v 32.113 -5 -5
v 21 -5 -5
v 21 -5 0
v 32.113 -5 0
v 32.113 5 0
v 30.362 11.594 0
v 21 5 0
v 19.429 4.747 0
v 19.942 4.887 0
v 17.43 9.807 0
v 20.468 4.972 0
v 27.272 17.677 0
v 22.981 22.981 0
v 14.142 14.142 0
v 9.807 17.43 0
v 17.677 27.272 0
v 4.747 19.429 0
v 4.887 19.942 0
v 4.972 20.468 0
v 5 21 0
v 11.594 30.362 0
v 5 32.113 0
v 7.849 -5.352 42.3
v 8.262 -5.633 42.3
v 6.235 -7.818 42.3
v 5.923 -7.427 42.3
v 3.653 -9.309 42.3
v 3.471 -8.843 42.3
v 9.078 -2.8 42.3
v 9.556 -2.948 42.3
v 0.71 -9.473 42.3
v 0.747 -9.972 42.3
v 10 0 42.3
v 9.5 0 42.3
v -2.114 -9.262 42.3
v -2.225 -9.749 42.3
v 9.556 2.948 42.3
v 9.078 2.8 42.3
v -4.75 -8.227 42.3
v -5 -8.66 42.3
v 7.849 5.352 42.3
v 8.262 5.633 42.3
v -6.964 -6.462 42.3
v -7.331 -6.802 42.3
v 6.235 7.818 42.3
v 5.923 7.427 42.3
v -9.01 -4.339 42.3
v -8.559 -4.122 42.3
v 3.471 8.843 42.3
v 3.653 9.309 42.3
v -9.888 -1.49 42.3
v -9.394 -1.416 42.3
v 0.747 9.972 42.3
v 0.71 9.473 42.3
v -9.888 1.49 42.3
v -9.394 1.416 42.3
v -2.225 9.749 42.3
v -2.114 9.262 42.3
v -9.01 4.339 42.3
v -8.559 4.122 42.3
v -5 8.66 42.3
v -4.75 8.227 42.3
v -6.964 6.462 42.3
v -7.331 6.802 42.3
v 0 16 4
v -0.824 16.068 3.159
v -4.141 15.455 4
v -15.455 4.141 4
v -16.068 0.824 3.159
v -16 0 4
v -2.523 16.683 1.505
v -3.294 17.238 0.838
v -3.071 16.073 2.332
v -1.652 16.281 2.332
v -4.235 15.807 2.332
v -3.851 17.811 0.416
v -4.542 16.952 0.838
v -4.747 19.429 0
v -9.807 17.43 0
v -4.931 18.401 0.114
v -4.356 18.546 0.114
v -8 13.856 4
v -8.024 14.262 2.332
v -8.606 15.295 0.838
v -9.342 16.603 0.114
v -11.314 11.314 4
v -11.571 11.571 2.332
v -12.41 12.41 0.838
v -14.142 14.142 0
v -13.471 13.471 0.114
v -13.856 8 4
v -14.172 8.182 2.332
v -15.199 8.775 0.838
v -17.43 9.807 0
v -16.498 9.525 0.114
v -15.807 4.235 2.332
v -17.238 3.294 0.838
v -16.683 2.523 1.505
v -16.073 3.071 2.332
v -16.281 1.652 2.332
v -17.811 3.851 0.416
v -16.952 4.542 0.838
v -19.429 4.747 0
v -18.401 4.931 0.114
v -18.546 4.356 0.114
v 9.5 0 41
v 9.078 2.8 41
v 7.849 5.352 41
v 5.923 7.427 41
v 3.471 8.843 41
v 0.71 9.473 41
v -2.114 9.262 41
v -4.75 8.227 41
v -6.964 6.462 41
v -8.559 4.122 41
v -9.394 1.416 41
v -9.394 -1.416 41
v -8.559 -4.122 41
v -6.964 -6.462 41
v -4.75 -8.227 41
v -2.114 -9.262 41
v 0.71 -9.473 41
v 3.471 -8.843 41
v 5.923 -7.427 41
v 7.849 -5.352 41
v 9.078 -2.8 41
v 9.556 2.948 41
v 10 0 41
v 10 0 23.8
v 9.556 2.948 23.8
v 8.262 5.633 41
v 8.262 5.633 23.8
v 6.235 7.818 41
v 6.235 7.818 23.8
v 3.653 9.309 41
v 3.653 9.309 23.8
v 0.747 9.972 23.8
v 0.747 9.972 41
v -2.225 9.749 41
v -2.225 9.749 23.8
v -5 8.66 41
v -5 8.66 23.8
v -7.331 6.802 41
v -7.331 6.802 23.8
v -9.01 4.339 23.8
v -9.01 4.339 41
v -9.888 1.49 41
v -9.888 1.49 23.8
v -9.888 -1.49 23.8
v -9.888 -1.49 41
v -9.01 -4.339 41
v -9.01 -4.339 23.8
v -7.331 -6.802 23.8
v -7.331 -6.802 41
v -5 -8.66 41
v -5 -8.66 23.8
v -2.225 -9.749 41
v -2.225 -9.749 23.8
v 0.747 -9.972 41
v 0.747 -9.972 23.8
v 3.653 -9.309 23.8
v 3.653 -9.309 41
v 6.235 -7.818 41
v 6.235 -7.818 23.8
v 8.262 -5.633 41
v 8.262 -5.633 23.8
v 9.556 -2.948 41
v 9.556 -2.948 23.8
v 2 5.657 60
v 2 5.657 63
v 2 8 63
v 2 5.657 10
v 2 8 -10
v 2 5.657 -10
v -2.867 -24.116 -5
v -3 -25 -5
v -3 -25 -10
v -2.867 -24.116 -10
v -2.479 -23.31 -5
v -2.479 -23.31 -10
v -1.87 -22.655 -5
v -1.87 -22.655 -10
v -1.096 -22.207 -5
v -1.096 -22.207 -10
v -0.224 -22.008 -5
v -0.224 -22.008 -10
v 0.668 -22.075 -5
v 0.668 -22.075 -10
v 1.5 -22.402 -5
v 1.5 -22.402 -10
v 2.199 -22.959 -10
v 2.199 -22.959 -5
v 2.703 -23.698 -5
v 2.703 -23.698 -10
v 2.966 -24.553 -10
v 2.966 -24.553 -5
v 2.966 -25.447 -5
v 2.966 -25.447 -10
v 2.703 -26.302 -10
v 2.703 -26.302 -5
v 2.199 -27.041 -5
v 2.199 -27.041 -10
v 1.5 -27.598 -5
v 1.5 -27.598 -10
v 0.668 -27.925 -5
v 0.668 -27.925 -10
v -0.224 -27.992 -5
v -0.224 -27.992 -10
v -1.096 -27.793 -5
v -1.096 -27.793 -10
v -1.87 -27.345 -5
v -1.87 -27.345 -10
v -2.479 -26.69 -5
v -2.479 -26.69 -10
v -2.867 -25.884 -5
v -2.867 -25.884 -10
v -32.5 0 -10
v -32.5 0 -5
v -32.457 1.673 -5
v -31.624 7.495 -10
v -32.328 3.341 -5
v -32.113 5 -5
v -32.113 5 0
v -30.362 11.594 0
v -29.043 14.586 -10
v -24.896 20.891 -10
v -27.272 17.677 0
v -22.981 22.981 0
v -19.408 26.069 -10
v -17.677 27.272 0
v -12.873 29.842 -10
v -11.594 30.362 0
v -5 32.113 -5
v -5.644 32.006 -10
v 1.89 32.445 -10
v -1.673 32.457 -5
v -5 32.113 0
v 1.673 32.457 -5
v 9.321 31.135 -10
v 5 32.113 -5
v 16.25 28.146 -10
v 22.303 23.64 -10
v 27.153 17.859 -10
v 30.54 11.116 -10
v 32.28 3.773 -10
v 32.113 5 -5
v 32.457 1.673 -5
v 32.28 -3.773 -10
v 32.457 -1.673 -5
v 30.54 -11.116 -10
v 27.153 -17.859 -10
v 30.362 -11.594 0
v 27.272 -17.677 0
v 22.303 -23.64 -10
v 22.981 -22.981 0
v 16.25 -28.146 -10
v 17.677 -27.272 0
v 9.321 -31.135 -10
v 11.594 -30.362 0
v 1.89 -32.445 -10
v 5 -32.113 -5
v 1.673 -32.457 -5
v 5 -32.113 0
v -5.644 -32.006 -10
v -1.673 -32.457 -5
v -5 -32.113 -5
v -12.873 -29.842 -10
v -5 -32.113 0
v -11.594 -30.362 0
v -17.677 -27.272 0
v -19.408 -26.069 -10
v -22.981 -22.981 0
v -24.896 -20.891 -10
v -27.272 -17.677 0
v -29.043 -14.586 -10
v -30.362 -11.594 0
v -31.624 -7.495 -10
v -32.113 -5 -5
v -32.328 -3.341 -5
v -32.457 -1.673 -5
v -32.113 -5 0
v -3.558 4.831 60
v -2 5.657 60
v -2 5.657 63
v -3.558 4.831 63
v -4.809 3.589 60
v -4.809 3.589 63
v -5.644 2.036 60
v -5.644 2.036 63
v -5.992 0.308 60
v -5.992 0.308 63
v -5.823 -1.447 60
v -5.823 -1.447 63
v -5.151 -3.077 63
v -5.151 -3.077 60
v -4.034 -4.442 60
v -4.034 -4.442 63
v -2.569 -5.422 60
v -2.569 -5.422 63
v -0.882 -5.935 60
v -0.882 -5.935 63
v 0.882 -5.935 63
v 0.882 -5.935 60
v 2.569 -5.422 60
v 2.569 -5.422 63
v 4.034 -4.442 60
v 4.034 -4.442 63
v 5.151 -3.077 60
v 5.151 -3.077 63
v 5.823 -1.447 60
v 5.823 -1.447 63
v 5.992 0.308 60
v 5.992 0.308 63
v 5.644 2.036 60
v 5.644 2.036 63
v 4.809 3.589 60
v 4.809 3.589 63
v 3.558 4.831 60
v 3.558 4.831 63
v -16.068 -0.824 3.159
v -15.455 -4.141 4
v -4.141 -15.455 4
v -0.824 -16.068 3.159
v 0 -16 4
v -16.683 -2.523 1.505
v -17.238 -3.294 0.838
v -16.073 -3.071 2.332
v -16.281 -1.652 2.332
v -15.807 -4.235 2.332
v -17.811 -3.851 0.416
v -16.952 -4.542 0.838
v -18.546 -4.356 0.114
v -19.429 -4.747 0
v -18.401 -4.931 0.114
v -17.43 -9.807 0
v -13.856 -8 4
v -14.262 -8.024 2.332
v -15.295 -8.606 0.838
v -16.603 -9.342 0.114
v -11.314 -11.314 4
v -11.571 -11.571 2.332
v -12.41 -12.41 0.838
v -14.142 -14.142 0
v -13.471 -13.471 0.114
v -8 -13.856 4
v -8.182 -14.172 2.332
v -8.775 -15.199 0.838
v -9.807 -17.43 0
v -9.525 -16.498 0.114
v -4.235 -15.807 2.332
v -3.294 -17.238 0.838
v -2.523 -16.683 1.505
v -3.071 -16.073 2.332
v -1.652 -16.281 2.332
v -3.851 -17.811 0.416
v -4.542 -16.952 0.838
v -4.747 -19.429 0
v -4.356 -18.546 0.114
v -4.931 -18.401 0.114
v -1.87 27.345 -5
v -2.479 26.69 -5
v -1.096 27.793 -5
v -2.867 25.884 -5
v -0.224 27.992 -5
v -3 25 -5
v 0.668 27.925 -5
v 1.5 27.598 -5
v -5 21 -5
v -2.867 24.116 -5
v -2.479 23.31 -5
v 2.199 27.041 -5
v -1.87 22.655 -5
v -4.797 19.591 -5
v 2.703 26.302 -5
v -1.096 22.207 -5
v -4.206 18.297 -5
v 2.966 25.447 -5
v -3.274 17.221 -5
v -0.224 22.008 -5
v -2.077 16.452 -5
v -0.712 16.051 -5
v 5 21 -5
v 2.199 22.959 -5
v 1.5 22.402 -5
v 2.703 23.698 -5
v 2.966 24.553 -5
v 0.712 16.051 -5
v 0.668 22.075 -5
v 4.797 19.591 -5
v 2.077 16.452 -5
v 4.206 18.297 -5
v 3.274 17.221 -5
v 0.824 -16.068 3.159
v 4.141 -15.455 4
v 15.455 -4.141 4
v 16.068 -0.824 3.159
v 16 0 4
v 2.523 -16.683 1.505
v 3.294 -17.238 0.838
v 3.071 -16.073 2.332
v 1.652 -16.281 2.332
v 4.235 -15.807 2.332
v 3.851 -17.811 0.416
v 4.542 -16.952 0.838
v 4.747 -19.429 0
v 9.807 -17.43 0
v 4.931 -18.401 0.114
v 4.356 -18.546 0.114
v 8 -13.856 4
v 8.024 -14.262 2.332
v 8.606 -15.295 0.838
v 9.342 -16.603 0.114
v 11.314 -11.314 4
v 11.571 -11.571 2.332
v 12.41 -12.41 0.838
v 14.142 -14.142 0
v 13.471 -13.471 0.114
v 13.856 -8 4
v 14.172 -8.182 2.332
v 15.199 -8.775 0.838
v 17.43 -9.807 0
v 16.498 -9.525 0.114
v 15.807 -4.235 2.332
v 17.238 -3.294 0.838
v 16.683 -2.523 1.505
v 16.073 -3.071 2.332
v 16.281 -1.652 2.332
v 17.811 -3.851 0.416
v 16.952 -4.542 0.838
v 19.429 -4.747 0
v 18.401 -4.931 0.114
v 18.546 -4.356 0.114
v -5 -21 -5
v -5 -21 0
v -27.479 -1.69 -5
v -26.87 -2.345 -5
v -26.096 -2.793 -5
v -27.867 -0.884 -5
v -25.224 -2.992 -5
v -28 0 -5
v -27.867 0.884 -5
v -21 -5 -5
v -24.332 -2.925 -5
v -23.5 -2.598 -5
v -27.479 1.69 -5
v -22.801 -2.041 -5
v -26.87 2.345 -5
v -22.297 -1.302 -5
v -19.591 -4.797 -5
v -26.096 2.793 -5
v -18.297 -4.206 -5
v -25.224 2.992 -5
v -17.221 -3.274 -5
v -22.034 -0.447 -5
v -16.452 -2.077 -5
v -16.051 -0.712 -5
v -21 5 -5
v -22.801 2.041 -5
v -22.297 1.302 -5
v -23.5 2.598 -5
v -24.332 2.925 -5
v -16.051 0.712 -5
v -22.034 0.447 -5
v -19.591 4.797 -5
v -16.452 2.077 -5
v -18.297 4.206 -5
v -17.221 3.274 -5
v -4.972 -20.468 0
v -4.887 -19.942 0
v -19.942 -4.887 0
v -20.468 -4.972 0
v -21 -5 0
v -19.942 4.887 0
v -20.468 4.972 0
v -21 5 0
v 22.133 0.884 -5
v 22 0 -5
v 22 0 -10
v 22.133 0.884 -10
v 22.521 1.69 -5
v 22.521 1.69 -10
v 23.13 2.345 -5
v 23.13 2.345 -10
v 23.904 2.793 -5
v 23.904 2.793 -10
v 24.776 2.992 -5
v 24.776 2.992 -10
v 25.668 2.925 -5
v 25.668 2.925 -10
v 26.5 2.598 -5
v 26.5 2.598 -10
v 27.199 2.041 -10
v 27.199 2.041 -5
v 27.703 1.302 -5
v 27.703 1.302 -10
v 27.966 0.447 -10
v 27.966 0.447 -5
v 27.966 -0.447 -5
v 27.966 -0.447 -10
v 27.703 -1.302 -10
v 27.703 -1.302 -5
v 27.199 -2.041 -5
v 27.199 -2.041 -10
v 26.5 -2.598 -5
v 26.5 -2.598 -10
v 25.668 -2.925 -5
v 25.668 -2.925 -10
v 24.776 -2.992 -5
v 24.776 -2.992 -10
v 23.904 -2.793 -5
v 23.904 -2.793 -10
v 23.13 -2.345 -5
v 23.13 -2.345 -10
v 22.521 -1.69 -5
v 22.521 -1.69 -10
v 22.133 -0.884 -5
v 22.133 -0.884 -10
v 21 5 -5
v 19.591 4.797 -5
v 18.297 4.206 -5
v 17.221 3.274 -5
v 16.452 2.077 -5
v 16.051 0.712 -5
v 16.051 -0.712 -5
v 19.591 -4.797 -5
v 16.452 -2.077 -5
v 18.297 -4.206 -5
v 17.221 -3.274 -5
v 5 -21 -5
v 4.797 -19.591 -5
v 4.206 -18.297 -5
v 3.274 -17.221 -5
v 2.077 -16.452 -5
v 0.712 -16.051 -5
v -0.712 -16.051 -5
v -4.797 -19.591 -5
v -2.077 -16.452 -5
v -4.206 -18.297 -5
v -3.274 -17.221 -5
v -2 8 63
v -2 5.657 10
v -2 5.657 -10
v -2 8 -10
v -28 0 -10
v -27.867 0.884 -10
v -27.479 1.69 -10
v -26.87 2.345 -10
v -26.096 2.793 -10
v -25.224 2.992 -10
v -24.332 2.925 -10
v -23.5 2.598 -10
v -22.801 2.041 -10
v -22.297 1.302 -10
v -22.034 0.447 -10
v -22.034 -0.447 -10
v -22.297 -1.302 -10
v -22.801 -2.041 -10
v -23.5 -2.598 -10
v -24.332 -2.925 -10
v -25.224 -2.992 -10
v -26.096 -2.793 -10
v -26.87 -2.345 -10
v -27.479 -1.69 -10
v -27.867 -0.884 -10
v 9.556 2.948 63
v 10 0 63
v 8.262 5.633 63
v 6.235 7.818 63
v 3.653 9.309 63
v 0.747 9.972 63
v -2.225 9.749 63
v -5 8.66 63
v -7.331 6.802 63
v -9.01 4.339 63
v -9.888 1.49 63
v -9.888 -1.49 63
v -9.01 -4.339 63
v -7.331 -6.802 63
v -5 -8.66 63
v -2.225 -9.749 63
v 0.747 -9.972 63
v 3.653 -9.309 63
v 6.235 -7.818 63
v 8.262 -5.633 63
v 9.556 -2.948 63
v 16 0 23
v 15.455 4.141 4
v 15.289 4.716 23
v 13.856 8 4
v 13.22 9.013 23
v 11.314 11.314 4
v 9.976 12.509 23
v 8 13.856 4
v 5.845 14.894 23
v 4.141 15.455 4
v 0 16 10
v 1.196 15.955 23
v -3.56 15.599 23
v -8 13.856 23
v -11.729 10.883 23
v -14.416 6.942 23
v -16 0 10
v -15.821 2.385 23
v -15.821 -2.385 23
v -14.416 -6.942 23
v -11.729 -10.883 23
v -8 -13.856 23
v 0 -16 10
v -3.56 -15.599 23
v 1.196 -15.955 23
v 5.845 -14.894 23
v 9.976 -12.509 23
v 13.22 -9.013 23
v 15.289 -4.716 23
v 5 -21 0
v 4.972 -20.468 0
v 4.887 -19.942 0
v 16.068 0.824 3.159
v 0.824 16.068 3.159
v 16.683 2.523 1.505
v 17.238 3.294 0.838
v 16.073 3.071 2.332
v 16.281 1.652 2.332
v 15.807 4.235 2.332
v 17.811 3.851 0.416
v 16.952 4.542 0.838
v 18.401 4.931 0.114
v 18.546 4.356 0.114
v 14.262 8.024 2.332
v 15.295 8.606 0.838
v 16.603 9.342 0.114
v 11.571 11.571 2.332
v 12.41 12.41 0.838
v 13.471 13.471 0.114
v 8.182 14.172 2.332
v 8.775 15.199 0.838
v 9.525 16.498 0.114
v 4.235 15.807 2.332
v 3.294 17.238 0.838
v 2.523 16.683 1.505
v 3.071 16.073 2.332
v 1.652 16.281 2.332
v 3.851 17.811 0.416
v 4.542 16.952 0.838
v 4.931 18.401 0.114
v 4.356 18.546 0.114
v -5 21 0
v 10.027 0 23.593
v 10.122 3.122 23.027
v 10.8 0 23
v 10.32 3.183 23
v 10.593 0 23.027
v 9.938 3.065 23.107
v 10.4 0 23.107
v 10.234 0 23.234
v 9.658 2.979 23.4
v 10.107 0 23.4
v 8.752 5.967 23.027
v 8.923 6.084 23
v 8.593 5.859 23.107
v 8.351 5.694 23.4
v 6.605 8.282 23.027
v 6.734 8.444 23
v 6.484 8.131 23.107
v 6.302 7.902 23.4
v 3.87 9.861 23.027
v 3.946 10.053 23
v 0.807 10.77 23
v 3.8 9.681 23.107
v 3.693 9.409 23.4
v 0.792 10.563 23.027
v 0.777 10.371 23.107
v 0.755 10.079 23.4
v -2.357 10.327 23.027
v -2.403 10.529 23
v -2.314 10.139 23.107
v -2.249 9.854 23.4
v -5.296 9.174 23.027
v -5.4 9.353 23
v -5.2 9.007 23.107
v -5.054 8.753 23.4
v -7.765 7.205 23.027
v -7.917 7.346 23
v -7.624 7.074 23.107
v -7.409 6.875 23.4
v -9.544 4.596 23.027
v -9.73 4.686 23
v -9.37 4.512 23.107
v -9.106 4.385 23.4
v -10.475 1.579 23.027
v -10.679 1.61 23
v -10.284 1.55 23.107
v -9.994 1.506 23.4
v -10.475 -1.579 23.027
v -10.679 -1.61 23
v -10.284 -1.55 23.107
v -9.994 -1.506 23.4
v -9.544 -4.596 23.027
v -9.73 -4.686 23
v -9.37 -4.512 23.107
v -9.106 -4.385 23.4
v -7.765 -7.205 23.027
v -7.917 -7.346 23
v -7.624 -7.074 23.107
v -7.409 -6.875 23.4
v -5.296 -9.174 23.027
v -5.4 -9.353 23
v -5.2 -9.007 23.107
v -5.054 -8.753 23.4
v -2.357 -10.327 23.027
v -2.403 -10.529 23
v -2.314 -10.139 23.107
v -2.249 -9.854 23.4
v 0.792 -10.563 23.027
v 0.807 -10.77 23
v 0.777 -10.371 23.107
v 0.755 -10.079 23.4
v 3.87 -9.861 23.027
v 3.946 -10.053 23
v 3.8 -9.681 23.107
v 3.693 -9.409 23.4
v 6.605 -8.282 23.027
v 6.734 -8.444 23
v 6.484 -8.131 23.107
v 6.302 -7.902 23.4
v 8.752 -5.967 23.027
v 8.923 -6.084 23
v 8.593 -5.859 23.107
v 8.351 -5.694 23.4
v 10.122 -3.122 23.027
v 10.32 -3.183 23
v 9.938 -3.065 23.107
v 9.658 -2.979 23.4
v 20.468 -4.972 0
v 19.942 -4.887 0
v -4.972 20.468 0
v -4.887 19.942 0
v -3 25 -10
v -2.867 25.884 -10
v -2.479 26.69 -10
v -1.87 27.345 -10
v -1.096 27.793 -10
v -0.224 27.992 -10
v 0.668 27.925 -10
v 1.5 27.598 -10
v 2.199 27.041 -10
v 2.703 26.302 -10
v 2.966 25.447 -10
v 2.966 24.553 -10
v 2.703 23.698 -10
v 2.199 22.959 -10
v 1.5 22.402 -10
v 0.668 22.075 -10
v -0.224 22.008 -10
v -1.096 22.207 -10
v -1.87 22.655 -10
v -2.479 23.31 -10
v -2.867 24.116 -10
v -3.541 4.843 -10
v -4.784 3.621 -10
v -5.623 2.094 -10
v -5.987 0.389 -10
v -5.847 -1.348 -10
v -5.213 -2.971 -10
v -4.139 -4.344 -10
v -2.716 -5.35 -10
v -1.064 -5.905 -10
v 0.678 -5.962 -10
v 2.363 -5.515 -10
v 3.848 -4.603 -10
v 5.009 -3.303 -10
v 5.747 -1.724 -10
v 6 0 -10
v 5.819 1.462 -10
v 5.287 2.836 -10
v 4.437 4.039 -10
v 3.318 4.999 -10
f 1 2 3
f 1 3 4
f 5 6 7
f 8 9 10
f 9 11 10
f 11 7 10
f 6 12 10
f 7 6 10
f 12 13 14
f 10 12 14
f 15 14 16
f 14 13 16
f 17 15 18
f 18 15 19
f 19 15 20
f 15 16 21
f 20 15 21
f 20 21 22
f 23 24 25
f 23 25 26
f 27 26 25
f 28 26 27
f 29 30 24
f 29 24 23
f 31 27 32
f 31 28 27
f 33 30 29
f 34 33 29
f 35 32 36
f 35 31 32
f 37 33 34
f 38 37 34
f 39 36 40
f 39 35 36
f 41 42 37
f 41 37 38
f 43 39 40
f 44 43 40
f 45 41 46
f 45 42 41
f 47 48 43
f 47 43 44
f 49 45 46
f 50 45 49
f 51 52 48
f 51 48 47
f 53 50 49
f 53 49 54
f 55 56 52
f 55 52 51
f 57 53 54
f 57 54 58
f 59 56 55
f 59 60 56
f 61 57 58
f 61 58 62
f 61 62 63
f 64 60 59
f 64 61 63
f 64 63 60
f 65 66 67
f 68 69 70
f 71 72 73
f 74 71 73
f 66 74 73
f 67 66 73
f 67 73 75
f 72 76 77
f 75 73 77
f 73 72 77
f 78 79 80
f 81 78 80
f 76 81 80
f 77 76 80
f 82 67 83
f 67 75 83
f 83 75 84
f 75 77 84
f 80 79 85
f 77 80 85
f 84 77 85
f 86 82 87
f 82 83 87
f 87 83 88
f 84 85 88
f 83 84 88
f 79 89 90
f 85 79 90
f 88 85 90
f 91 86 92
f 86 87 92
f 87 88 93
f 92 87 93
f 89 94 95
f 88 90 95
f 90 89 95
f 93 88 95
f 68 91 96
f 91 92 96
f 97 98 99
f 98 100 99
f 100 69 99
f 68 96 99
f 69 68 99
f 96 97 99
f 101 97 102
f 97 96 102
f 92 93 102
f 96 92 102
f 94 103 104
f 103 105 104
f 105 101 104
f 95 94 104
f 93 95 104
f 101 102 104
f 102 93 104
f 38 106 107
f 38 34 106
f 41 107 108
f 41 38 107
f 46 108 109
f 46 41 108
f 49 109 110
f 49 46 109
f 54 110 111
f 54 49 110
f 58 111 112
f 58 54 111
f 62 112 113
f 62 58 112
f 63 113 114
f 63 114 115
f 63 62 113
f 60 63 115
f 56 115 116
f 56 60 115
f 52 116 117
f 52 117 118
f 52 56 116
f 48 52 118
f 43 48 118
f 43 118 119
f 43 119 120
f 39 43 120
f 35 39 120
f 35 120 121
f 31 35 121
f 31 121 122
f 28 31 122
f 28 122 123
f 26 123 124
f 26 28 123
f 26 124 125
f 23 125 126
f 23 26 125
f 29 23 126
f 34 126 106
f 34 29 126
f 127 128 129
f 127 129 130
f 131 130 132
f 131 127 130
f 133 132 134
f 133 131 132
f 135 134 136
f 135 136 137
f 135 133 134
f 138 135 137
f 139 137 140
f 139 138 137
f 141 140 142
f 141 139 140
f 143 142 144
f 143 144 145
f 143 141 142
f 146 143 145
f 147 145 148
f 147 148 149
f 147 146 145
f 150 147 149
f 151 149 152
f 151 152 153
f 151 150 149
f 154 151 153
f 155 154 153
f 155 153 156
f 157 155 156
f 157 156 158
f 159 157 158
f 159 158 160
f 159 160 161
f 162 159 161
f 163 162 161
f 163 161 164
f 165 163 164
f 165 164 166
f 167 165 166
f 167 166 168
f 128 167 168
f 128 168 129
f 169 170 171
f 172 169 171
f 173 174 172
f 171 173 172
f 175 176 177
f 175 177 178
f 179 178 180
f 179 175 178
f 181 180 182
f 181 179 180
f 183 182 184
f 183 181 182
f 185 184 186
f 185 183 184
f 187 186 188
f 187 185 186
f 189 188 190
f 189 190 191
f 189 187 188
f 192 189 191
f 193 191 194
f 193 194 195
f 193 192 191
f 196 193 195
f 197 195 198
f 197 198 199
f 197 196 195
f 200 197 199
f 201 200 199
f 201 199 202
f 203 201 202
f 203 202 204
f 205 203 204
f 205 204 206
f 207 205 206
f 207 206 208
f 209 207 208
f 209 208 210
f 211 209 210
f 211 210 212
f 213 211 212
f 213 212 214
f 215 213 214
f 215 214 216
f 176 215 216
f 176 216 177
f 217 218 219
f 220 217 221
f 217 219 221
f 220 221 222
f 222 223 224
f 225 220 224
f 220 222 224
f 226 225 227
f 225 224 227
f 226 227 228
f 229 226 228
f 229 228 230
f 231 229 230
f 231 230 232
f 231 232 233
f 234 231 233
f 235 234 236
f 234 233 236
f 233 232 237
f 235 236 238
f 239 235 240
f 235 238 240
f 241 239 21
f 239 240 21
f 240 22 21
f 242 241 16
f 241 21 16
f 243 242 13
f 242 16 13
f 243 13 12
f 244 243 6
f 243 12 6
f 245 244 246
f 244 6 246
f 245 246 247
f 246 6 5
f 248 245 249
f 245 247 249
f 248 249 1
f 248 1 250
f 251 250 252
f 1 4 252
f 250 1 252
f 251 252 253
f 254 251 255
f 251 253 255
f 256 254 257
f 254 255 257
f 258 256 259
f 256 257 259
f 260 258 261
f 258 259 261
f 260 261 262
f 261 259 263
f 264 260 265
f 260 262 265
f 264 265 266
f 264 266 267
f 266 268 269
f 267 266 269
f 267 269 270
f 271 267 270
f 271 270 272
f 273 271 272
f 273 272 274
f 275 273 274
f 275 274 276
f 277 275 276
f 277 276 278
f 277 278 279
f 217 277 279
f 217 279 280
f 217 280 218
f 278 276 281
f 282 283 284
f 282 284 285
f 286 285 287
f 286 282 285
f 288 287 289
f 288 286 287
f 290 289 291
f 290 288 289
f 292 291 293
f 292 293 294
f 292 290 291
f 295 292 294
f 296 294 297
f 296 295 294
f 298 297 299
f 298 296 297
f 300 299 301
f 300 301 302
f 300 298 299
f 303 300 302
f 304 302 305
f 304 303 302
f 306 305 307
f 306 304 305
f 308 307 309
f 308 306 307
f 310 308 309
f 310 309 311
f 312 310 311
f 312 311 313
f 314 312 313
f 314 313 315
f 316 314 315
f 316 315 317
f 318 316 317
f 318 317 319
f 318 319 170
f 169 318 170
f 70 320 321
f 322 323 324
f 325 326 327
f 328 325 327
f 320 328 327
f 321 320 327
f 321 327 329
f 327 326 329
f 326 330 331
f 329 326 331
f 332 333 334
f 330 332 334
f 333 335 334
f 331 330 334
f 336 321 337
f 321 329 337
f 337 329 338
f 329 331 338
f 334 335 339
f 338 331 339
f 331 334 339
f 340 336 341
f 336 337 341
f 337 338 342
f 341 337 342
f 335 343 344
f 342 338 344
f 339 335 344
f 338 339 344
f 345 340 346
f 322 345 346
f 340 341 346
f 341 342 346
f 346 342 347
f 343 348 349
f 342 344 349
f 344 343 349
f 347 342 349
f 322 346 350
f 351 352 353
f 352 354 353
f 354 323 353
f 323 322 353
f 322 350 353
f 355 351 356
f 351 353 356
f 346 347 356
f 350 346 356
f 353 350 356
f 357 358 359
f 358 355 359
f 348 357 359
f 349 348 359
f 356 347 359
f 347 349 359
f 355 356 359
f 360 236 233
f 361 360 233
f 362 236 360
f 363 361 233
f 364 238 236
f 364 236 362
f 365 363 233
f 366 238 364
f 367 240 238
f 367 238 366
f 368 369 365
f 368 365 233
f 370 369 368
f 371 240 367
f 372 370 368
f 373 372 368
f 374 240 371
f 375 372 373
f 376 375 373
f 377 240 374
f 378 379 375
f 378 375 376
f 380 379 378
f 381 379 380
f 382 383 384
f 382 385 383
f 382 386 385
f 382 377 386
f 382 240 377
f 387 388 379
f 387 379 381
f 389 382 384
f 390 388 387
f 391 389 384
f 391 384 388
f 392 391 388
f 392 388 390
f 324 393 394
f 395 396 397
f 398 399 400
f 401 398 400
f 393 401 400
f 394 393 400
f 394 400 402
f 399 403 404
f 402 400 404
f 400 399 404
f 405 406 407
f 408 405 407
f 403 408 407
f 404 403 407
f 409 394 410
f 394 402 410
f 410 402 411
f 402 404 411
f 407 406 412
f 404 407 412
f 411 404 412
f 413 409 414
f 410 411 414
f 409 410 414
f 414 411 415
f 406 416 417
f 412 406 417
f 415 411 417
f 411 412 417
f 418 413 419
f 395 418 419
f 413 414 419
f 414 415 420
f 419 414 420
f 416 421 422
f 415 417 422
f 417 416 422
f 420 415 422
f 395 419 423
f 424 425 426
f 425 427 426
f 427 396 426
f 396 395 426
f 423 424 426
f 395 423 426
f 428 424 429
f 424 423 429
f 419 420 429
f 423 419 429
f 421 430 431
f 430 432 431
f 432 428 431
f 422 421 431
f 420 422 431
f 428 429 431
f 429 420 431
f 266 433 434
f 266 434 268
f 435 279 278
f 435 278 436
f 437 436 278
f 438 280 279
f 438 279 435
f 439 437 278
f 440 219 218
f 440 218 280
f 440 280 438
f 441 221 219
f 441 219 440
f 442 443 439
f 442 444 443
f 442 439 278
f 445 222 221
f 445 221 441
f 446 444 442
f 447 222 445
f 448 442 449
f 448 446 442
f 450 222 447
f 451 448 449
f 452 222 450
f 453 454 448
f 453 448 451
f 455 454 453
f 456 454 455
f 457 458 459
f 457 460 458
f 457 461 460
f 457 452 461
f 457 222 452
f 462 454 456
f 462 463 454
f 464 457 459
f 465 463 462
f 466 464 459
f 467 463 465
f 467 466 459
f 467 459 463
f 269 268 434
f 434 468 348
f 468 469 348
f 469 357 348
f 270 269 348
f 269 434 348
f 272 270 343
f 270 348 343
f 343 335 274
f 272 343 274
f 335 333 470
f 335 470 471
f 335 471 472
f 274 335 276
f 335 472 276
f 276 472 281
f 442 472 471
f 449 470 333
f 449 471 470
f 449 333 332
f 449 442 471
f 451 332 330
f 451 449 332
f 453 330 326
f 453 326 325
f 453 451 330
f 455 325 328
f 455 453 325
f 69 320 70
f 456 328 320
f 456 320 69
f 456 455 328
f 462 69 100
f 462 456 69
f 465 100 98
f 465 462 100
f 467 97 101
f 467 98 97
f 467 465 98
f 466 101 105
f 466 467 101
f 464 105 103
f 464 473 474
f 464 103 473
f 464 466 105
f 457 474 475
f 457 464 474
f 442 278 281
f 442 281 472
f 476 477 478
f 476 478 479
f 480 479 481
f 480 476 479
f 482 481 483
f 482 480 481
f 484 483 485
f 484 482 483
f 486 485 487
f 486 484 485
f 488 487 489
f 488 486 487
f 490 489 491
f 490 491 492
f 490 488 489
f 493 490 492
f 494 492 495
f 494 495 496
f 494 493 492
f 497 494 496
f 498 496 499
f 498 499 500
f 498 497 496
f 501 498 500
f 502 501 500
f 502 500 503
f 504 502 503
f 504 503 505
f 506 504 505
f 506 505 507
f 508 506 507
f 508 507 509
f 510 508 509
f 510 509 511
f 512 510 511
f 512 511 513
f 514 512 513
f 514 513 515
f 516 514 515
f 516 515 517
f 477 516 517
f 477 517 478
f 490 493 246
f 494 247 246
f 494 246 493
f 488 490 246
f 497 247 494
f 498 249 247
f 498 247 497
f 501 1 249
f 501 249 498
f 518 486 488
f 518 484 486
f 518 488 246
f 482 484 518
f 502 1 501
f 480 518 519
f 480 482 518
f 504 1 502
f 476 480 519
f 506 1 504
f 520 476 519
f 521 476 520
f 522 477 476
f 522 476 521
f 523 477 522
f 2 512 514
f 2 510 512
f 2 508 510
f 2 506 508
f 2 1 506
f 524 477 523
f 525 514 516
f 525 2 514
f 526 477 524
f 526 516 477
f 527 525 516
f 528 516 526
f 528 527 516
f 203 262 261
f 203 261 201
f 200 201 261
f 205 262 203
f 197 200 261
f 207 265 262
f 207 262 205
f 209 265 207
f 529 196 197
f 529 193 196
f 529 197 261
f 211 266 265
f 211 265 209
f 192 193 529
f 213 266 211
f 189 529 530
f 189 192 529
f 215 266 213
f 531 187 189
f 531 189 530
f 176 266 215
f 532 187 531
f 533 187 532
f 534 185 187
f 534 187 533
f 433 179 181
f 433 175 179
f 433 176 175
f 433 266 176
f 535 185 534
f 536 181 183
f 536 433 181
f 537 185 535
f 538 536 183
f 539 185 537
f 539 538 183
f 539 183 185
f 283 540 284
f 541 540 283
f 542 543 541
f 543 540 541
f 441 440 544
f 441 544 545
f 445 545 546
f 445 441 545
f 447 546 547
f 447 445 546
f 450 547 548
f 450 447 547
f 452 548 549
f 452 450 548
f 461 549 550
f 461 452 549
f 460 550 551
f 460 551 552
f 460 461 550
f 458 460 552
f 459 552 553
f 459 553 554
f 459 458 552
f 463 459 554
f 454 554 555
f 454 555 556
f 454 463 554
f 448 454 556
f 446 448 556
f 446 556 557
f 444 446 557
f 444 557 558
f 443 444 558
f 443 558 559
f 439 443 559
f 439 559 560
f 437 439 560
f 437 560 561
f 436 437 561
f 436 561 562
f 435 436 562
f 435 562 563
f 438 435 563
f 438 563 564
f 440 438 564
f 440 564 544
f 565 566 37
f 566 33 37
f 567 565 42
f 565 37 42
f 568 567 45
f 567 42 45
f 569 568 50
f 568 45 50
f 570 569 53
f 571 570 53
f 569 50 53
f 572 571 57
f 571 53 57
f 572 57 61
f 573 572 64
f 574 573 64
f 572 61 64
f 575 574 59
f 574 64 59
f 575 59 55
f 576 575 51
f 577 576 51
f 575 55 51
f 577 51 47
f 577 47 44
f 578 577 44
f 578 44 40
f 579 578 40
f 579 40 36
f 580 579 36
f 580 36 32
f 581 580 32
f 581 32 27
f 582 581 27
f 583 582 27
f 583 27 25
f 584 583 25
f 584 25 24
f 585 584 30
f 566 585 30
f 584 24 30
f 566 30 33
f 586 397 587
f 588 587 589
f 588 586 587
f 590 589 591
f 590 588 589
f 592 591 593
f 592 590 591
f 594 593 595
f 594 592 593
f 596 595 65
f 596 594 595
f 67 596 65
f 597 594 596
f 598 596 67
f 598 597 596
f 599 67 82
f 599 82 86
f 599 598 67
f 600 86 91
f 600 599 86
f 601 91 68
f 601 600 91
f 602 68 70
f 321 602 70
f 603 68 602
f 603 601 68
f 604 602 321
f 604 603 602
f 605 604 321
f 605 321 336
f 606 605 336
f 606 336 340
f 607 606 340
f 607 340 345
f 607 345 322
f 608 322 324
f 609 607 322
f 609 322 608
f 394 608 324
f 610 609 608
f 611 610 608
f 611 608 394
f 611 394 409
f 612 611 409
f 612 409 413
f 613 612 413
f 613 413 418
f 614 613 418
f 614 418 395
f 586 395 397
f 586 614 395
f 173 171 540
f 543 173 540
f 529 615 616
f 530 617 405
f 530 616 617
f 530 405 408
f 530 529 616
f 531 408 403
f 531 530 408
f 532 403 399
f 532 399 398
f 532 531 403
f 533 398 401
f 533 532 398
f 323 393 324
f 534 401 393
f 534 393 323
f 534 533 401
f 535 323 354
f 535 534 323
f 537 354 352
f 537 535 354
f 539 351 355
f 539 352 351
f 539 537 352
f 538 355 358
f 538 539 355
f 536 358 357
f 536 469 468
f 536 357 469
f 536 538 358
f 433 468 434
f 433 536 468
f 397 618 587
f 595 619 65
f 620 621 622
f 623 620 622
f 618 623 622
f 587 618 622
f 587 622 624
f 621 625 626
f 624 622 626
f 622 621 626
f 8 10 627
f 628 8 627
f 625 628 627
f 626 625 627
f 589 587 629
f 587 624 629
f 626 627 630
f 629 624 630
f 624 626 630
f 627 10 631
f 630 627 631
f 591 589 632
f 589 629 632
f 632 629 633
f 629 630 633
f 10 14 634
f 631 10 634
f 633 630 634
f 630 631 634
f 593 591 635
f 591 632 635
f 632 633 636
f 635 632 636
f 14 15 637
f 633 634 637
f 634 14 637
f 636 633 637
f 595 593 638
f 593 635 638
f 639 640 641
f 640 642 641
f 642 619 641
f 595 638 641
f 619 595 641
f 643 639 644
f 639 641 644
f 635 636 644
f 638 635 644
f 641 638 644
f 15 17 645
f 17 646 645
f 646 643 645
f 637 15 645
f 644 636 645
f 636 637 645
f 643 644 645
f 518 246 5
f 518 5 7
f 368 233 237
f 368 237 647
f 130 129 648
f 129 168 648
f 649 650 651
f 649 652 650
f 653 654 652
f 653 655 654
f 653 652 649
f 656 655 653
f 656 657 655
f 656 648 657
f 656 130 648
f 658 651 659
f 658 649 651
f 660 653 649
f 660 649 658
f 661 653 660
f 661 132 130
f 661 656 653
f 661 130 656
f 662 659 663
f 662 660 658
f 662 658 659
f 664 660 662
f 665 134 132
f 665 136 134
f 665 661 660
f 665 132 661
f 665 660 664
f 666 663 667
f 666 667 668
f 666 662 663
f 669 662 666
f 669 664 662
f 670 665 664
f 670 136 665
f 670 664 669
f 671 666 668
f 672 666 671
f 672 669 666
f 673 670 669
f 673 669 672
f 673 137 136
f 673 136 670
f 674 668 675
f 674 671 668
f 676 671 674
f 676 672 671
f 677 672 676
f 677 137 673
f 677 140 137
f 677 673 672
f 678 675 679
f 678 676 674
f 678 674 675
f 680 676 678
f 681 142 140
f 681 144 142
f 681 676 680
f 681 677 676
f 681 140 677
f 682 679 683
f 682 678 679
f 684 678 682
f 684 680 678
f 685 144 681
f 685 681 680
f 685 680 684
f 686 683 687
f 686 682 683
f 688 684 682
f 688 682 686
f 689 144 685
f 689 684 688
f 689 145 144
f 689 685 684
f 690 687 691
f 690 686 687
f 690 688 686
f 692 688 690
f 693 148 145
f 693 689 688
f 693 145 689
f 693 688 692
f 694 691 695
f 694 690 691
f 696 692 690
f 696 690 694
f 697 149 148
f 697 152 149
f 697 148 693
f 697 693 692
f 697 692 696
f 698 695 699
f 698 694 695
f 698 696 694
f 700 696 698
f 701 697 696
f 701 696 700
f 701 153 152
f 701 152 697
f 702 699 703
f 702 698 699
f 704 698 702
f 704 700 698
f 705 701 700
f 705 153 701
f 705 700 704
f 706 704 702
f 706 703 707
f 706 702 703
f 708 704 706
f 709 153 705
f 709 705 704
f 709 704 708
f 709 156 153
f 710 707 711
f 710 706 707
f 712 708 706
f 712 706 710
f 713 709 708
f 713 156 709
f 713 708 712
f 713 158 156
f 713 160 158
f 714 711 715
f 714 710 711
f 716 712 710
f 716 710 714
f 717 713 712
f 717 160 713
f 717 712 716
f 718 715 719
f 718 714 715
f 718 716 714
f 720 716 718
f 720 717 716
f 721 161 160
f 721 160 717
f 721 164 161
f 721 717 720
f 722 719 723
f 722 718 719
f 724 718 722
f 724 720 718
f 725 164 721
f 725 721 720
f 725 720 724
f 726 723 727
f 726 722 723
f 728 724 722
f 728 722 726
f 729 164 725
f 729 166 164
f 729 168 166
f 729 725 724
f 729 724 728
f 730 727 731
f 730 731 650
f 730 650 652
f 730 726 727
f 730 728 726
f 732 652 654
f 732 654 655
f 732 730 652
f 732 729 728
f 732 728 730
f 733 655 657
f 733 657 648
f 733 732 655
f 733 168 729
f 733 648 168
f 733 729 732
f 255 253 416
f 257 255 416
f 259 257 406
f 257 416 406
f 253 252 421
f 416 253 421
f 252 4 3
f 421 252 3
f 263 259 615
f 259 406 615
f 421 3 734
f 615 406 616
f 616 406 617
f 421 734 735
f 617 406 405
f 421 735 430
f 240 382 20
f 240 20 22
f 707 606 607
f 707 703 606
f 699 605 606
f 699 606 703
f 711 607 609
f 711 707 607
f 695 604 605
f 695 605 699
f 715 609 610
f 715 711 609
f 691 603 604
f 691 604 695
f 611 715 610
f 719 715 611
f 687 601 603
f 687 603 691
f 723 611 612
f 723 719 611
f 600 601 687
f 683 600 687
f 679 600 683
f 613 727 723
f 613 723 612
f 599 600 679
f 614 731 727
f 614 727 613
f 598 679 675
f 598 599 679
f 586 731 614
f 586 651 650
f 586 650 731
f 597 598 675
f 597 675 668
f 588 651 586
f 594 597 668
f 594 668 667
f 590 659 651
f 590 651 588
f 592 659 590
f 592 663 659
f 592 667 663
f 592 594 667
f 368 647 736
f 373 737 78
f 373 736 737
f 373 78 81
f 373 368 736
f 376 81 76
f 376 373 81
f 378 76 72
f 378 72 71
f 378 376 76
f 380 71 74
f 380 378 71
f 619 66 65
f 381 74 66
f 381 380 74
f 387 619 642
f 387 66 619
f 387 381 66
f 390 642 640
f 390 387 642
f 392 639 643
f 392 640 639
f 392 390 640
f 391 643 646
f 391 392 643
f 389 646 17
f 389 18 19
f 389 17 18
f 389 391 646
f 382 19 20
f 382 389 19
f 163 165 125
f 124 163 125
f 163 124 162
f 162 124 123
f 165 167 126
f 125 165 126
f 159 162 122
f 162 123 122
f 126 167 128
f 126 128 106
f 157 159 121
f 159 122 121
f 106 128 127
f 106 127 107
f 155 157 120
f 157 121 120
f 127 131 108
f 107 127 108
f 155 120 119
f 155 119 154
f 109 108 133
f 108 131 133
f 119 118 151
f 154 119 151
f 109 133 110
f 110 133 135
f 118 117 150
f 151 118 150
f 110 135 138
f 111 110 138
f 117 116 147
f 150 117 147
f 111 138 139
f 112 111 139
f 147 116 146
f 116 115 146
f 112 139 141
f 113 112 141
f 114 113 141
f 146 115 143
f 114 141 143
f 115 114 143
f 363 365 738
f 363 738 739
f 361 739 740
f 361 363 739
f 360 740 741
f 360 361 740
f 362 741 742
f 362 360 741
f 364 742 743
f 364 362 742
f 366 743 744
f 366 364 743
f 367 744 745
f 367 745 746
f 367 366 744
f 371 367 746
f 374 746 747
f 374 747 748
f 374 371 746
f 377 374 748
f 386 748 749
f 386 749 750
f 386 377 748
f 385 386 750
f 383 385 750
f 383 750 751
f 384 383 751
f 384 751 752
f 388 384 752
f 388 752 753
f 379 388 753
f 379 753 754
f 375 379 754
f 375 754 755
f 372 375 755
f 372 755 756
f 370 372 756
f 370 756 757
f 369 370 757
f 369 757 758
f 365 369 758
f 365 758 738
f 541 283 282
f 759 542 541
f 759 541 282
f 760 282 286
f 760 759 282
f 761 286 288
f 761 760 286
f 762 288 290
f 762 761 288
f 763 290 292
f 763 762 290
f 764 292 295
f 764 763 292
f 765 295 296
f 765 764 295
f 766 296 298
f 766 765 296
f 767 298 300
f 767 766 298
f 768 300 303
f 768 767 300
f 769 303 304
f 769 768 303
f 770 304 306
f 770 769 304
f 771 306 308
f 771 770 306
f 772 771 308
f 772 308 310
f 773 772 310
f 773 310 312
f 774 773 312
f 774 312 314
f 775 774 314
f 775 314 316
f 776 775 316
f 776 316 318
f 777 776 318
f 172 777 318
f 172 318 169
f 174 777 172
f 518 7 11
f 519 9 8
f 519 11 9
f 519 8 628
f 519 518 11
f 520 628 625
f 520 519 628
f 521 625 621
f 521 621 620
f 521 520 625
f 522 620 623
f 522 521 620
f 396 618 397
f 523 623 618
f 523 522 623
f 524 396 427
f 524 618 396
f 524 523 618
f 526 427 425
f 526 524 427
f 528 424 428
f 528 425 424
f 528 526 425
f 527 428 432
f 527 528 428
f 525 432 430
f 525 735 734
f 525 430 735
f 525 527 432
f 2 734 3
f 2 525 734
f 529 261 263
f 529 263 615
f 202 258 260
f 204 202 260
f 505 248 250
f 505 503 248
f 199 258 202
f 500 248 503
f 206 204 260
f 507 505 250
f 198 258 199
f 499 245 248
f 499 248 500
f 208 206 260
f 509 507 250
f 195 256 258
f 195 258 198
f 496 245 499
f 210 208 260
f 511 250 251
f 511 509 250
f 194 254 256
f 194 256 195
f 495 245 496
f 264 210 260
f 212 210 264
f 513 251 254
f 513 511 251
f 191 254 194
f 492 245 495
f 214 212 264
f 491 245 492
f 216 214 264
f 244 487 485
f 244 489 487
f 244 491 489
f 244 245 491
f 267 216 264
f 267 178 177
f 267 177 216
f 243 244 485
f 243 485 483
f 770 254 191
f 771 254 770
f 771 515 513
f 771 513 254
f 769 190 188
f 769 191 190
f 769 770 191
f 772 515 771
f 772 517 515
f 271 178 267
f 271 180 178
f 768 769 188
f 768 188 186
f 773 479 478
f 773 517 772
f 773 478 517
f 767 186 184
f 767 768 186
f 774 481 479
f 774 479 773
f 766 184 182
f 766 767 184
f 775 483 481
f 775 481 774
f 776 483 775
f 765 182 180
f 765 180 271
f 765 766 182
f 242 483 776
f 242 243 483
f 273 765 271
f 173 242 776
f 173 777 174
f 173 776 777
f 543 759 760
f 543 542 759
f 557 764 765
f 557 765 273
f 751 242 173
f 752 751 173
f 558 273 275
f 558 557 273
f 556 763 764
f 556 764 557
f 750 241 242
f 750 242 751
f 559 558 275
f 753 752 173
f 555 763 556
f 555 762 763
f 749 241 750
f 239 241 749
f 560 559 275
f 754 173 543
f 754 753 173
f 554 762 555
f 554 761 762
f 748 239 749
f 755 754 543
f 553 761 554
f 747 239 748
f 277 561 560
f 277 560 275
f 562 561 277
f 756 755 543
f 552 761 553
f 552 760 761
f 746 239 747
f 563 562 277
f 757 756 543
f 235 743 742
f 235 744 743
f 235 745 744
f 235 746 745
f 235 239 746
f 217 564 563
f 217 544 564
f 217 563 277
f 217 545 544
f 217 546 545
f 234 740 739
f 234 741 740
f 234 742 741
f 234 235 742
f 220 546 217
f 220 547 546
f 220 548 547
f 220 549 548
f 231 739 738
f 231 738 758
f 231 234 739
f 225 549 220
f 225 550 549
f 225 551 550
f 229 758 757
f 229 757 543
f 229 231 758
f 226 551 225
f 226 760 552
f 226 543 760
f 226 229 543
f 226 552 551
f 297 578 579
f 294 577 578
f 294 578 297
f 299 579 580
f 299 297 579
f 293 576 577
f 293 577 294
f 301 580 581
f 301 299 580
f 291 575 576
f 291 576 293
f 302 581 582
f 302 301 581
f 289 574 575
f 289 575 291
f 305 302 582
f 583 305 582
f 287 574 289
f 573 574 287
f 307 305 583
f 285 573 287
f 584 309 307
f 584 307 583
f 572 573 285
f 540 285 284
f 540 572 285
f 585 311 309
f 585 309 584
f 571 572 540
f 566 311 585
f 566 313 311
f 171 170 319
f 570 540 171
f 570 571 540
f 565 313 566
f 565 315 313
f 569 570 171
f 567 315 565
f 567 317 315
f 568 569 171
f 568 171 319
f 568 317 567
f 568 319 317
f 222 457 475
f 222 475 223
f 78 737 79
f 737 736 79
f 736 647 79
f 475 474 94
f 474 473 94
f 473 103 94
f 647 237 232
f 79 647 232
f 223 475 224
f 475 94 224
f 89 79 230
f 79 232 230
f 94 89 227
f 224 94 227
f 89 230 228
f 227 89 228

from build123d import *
from build123d.topology import SkipClean

# Parameters (mm, degrees)
SZKIC1_R                         = 10
DODANIE_WYCI_GNI_CIE1_DEPTH      = 60
SZKIC3_R                         = 6
WYTNIJ_WYCI_GNI_CIE1_DEPTH       = 50
WYTNIJ_WYCI_GNI_CIE2_DEPTH       = 20
SZKIC9_R                         = 32.5
SZKIC9_R_2                       = 3
SZKIC9_R_3                       = 10
DODANIE_WYCI_GNI_CIE3_DEPTH      = 10
SZKIC12_R                        = 10
DODANIE_WYCI_GNI_CIE4_DEPTH      = 10
DODANIE_WYCI_GNI_CIE6_DEPTH      = 4
DODANIE_WYCI_GNI_CIE6_DEPTH_BACK = 10
SZKIC13_R                        = 16
SZKIC13_R_2                      = 10
SZKIC14_W                        = 1.3
SZKIC14_H                        = 0.5
FILLET3_R                        = 4
WYTNIJ_WYCI_GNI_CIE4_START       = -5
WYTNIJ_WYCI_GNI_CIE4_DEPTH       = 15
CUT_EXTRUDE1_DEPTH               = 84.740671122
CUT_EXTRUDE1_DEPTH_BACK          = 84.740671122
FILLET1_R                        = 0.8
CIRPATTERN1_COUNT                = 4
PRZENIE_CIAN_1_OUTLINE_W         = 0.5
PRZENIE_CIAN_1_OUTLINE_H         = 1.3
PRZENIE_CIAN_1_2_OUTLINE_W       = 0.5
PRZENIE_CIAN_1_2_OUTLINE_H       = 1.3
PRZENIE_CIAN_2_BY                = 3


with BuildPart() as part:
    # Szkic1 → Dodanie-wyciągnięcie1 (new body)
    with BuildSketch(Plane.XY):
        Circle(SZKIC1_R)
    extrude(amount=DODANIE_WYCI_GNI_CIE1_DEPTH)

    # Szkic3 → Wytnij-wyciągnięcie1 (cut)
    with BuildSketch(Plane.XY.offset(60)):
        Circle(SZKIC3_R)
    extrude(amount=-WYTNIJ_WYCI_GNI_CIE1_DEPTH, mode=Mode.SUBTRACT)

    # Szkic8 → Wytnij-wyciągnięcie2 (cut)
    with BuildSketch(Plane.XY.offset(60)):
        with BuildLine():
            Line((0, 8), (0, 6))
            ThreePointArc((0, 6), (1.014611872, 5.913591358), (2, 5.656854249))
            Line((2, 5.656854249), (2, 8))
            Line((2, 8), (0, 8))
        make_face()
        with BuildLine():
            ThreePointArc((-2, 5.656854249), (-1.014611872, 5.913591358), (0, 6))
            Line((0, 6), (0, 8))
            Line((0, 8), (-2, 8))
            Line((-2, 8), (-2, 5.656854249))
        make_face()
    extrude(amount=-WYTNIJ_WYCI_GNI_CIE2_DEPTH, mode=Mode.SUBTRACT)


with BuildPart() as body_2:
    # Szkic9 → Dodanie-wyciągnięcie3 (new body)
    with BuildSketch(Plane(origin=(0, 0, 0), x_dir=(-1, 0, 0), z_dir=(0, 0, -1))):
        Circle(SZKIC9_R)
        with Locations((0, 25)):
            Circle(SZKIC9_R_2, mode=Mode.SUBTRACT)
        with Locations((-25, 0)):
            Circle(SZKIC9_R_2, mode=Mode.SUBTRACT)
        with Locations((0, -25)):
            Circle(SZKIC9_R_2, mode=Mode.SUBTRACT)
        with Locations((25, 0)):
            Circle(SZKIC9_R_2, mode=Mode.SUBTRACT)
        with Locations(Location((0, 0, 0), (0, 0, 180))):
            Circle(SZKIC9_R_3, mode=Mode.SUBTRACT)
    extrude(amount=DODANIE_WYCI_GNI_CIE3_DEPTH)


with BuildPart() as dodanie_wyci_gni_cie4_tool:
    # Szkic12 → Dodanie-wyciągnięcie4 (new body)
    with BuildSketch(Plane(origin=(0, 0, -10), x_dir=(-1, 0, 0), z_dir=(0, 0, -1))):
        Circle(SZKIC12_R)
    extrude(amount=-DODANIE_WYCI_GNI_CIE4_DEPTH)


with BuildPart() as part_1:
    add(part.part)


with BuildPart() as part_2:
    # Dodanie-wyciągnięcie4: joined with dodanie_wyci_gni_cie4_tool
    add(part_1.part.fuse(dodanie_wyci_gni_cie4_tool.part, body_2.part, tol=0.00001))

    # Szkic13 → Dodanie-wyciągnięcie6 (add, two sides: drawn at the far end of the back side and taken through both)
    with BuildSketch(Plane.XY.offset(10).offset(-DODANIE_WYCI_GNI_CIE6_DEPTH_BACK)):
        Circle(SZKIC13_R)
        Circle(SZKIC13_R_2, mode=Mode.SUBTRACT)
    extrude(amount=DODANIE_WYCI_GNI_CIE6_DEPTH + DODANIE_WYCI_GNI_CIE6_DEPTH_BACK)

    # Szkic14 → Wycięcie-obrót1 (revolve, cut)
    with BuildSketch(Plane(origin=(0, 0, 0), x_dir=(0, 0, -1), z_dir=(1, 0, 0)), mode=Mode.PRIVATE) as wyci_cie_obr_t1_sk:
        with Locations((-32.65, 9.75)):
            Rectangle(SZKIC14_W, SZKIC14_H)
    revolve(wyci_cie_obr_t1_sk.sketch.rotate(Axis((0, 0, 10), (0, 0, 1)), 90), axis=Axis((0, 0, 10), (0, 0, 1)), mode=Mode.SUBTRACT)

    # Fillet3
    fillet3_edges = [part_2.edges().sort_by_distance(p)[0] for p in [
        (-16, 0, 0),
    ]]
    fillet(fillet3_edges, radius=FILLET3_R)

    # Szkic15 → Wytnij-wyciągnięcie4 (cut)
    with SkipClean():  # the faces are left unmerged after this step: merging them gives an invalid solid
        with BuildSketch(Plane.XY.offset(WYTNIJ_WYCI_GNI_CIE4_START)):
            with BuildLine():
                Line((-21, 5), (-38.344899327, 5))
                Line((-38.344899327, 5), (-38.344899327, -5))
                Line((-38.344899327, -5), (-21, -5))
                ThreePointArc((-21, -5), (-16, 0), (-21, 5))
            make_face()
        wytnij_wyci_gni_cie4 = extrude(amount=WYTNIJ_WYCI_GNI_CIE4_DEPTH, mode=Mode.SUBTRACT)

    # Sketch1 → Cut-Extrude1 (cut, two sides: drawn at the far end of the back side and taken through both)
    with SkipClean():  # the faces are left unmerged after this step: merging them gives an invalid solid
        with BuildSketch(Plane.XY.offset(60).offset(-CUT_EXTRUDE1_DEPTH_BACK)):
            with BuildLine():
                ThreePointArc((2, 5.656854249), (0, 6), (-2, 5.656854249))
                ThreePointArc((-2, 5.656854249), (-3.464101615, -4.898979486), (6, 0))
                ThreePointArc((6, 0), (4.898979486, 3.464101615), (2, 5.656854249))
            make_face()
            with BuildLine():
                Line((2, 8), (-2, 8))
                Line((-2, 8), (-2, 5.656854249))
                ThreePointArc((-2, 5.656854249), (0, 6), (2, 5.656854249))
                Line((2, 5.656854249), (2, 8))
            make_face()
        extrude(amount=CUT_EXTRUDE1_DEPTH + CUT_EXTRUDE1_DEPTH_BACK, mode=Mode.SUBTRACT)

    # Fillet1
    fillet1_edges = [part_2.edges().sort_by_distance(p)[0] for p in [
        (-10, 0, 14),
    ]]
    fillet(fillet1_edges, radius=FILLET1_R)

    # CirPattern1: Wytnij-wyciągnięcie4 ×4 about axis
    cirpattern1_axis = Axis((0, 0, 0), (0, 0, 1))
    for i in range(1, CIRPATTERN1_COUNT):
        add(wytnij_wyci_gni_cie4.rotate(cirpattern1_axis, i * 360 / CIRPATTERN1_COUNT), mode=Mode.SUBTRACT)

    # Przenieś ścianę1: read off the stored shape, not the designer's step
    # Przenieś ścianę1 outline → Przenieś ścianę1 (revolve, cut)
    with BuildSketch(Plane.XZ):
        with Locations((9.75, 41.65)):
            Rectangle(PRZENIE_CIAN_1_OUTLINE_W, PRZENIE_CIAN_1_OUTLINE_H)
    revolve(axis=Axis((0, 0, 0), (0, 0, 1)), mode=Mode.SUBTRACT)

    # Przenie_ _cian_1 2 outline → Przenie_ _cian_1 2 (revolve)
    with BuildSketch(Plane.XZ):
        with Locations((9.75, 32.65)):
            Rectangle(PRZENIE_CIAN_1_2_OUTLINE_W, PRZENIE_CIAN_1_2_OUTLINE_H)
        with BuildLine():
            ThreePointArc((10.8, 23), (10.234314575, 23.234314575), (10, 23.8))
            Line((10, 23.8), (10, 14.8))
            ThreePointArc((10, 14.8), (10.234314575, 14.234314575), (10.8, 14))
            Line((10.8, 14), (16, 14))
            Line((16, 14), (16, 23))
            Line((16, 23), (10.8, 23))
        make_face()
    revolve(axis=Axis((0, 0, 0), (0, 0, 1)))

    # Przenieś ścianę2: a face moved outward by 3.0
    extrude(part_2.faces().sort_by_distance((0, -8, 60))[0], amount=PRZENIE_CIAN_2_BY, dir=(0, 0, 1))


solid = part_2.part
